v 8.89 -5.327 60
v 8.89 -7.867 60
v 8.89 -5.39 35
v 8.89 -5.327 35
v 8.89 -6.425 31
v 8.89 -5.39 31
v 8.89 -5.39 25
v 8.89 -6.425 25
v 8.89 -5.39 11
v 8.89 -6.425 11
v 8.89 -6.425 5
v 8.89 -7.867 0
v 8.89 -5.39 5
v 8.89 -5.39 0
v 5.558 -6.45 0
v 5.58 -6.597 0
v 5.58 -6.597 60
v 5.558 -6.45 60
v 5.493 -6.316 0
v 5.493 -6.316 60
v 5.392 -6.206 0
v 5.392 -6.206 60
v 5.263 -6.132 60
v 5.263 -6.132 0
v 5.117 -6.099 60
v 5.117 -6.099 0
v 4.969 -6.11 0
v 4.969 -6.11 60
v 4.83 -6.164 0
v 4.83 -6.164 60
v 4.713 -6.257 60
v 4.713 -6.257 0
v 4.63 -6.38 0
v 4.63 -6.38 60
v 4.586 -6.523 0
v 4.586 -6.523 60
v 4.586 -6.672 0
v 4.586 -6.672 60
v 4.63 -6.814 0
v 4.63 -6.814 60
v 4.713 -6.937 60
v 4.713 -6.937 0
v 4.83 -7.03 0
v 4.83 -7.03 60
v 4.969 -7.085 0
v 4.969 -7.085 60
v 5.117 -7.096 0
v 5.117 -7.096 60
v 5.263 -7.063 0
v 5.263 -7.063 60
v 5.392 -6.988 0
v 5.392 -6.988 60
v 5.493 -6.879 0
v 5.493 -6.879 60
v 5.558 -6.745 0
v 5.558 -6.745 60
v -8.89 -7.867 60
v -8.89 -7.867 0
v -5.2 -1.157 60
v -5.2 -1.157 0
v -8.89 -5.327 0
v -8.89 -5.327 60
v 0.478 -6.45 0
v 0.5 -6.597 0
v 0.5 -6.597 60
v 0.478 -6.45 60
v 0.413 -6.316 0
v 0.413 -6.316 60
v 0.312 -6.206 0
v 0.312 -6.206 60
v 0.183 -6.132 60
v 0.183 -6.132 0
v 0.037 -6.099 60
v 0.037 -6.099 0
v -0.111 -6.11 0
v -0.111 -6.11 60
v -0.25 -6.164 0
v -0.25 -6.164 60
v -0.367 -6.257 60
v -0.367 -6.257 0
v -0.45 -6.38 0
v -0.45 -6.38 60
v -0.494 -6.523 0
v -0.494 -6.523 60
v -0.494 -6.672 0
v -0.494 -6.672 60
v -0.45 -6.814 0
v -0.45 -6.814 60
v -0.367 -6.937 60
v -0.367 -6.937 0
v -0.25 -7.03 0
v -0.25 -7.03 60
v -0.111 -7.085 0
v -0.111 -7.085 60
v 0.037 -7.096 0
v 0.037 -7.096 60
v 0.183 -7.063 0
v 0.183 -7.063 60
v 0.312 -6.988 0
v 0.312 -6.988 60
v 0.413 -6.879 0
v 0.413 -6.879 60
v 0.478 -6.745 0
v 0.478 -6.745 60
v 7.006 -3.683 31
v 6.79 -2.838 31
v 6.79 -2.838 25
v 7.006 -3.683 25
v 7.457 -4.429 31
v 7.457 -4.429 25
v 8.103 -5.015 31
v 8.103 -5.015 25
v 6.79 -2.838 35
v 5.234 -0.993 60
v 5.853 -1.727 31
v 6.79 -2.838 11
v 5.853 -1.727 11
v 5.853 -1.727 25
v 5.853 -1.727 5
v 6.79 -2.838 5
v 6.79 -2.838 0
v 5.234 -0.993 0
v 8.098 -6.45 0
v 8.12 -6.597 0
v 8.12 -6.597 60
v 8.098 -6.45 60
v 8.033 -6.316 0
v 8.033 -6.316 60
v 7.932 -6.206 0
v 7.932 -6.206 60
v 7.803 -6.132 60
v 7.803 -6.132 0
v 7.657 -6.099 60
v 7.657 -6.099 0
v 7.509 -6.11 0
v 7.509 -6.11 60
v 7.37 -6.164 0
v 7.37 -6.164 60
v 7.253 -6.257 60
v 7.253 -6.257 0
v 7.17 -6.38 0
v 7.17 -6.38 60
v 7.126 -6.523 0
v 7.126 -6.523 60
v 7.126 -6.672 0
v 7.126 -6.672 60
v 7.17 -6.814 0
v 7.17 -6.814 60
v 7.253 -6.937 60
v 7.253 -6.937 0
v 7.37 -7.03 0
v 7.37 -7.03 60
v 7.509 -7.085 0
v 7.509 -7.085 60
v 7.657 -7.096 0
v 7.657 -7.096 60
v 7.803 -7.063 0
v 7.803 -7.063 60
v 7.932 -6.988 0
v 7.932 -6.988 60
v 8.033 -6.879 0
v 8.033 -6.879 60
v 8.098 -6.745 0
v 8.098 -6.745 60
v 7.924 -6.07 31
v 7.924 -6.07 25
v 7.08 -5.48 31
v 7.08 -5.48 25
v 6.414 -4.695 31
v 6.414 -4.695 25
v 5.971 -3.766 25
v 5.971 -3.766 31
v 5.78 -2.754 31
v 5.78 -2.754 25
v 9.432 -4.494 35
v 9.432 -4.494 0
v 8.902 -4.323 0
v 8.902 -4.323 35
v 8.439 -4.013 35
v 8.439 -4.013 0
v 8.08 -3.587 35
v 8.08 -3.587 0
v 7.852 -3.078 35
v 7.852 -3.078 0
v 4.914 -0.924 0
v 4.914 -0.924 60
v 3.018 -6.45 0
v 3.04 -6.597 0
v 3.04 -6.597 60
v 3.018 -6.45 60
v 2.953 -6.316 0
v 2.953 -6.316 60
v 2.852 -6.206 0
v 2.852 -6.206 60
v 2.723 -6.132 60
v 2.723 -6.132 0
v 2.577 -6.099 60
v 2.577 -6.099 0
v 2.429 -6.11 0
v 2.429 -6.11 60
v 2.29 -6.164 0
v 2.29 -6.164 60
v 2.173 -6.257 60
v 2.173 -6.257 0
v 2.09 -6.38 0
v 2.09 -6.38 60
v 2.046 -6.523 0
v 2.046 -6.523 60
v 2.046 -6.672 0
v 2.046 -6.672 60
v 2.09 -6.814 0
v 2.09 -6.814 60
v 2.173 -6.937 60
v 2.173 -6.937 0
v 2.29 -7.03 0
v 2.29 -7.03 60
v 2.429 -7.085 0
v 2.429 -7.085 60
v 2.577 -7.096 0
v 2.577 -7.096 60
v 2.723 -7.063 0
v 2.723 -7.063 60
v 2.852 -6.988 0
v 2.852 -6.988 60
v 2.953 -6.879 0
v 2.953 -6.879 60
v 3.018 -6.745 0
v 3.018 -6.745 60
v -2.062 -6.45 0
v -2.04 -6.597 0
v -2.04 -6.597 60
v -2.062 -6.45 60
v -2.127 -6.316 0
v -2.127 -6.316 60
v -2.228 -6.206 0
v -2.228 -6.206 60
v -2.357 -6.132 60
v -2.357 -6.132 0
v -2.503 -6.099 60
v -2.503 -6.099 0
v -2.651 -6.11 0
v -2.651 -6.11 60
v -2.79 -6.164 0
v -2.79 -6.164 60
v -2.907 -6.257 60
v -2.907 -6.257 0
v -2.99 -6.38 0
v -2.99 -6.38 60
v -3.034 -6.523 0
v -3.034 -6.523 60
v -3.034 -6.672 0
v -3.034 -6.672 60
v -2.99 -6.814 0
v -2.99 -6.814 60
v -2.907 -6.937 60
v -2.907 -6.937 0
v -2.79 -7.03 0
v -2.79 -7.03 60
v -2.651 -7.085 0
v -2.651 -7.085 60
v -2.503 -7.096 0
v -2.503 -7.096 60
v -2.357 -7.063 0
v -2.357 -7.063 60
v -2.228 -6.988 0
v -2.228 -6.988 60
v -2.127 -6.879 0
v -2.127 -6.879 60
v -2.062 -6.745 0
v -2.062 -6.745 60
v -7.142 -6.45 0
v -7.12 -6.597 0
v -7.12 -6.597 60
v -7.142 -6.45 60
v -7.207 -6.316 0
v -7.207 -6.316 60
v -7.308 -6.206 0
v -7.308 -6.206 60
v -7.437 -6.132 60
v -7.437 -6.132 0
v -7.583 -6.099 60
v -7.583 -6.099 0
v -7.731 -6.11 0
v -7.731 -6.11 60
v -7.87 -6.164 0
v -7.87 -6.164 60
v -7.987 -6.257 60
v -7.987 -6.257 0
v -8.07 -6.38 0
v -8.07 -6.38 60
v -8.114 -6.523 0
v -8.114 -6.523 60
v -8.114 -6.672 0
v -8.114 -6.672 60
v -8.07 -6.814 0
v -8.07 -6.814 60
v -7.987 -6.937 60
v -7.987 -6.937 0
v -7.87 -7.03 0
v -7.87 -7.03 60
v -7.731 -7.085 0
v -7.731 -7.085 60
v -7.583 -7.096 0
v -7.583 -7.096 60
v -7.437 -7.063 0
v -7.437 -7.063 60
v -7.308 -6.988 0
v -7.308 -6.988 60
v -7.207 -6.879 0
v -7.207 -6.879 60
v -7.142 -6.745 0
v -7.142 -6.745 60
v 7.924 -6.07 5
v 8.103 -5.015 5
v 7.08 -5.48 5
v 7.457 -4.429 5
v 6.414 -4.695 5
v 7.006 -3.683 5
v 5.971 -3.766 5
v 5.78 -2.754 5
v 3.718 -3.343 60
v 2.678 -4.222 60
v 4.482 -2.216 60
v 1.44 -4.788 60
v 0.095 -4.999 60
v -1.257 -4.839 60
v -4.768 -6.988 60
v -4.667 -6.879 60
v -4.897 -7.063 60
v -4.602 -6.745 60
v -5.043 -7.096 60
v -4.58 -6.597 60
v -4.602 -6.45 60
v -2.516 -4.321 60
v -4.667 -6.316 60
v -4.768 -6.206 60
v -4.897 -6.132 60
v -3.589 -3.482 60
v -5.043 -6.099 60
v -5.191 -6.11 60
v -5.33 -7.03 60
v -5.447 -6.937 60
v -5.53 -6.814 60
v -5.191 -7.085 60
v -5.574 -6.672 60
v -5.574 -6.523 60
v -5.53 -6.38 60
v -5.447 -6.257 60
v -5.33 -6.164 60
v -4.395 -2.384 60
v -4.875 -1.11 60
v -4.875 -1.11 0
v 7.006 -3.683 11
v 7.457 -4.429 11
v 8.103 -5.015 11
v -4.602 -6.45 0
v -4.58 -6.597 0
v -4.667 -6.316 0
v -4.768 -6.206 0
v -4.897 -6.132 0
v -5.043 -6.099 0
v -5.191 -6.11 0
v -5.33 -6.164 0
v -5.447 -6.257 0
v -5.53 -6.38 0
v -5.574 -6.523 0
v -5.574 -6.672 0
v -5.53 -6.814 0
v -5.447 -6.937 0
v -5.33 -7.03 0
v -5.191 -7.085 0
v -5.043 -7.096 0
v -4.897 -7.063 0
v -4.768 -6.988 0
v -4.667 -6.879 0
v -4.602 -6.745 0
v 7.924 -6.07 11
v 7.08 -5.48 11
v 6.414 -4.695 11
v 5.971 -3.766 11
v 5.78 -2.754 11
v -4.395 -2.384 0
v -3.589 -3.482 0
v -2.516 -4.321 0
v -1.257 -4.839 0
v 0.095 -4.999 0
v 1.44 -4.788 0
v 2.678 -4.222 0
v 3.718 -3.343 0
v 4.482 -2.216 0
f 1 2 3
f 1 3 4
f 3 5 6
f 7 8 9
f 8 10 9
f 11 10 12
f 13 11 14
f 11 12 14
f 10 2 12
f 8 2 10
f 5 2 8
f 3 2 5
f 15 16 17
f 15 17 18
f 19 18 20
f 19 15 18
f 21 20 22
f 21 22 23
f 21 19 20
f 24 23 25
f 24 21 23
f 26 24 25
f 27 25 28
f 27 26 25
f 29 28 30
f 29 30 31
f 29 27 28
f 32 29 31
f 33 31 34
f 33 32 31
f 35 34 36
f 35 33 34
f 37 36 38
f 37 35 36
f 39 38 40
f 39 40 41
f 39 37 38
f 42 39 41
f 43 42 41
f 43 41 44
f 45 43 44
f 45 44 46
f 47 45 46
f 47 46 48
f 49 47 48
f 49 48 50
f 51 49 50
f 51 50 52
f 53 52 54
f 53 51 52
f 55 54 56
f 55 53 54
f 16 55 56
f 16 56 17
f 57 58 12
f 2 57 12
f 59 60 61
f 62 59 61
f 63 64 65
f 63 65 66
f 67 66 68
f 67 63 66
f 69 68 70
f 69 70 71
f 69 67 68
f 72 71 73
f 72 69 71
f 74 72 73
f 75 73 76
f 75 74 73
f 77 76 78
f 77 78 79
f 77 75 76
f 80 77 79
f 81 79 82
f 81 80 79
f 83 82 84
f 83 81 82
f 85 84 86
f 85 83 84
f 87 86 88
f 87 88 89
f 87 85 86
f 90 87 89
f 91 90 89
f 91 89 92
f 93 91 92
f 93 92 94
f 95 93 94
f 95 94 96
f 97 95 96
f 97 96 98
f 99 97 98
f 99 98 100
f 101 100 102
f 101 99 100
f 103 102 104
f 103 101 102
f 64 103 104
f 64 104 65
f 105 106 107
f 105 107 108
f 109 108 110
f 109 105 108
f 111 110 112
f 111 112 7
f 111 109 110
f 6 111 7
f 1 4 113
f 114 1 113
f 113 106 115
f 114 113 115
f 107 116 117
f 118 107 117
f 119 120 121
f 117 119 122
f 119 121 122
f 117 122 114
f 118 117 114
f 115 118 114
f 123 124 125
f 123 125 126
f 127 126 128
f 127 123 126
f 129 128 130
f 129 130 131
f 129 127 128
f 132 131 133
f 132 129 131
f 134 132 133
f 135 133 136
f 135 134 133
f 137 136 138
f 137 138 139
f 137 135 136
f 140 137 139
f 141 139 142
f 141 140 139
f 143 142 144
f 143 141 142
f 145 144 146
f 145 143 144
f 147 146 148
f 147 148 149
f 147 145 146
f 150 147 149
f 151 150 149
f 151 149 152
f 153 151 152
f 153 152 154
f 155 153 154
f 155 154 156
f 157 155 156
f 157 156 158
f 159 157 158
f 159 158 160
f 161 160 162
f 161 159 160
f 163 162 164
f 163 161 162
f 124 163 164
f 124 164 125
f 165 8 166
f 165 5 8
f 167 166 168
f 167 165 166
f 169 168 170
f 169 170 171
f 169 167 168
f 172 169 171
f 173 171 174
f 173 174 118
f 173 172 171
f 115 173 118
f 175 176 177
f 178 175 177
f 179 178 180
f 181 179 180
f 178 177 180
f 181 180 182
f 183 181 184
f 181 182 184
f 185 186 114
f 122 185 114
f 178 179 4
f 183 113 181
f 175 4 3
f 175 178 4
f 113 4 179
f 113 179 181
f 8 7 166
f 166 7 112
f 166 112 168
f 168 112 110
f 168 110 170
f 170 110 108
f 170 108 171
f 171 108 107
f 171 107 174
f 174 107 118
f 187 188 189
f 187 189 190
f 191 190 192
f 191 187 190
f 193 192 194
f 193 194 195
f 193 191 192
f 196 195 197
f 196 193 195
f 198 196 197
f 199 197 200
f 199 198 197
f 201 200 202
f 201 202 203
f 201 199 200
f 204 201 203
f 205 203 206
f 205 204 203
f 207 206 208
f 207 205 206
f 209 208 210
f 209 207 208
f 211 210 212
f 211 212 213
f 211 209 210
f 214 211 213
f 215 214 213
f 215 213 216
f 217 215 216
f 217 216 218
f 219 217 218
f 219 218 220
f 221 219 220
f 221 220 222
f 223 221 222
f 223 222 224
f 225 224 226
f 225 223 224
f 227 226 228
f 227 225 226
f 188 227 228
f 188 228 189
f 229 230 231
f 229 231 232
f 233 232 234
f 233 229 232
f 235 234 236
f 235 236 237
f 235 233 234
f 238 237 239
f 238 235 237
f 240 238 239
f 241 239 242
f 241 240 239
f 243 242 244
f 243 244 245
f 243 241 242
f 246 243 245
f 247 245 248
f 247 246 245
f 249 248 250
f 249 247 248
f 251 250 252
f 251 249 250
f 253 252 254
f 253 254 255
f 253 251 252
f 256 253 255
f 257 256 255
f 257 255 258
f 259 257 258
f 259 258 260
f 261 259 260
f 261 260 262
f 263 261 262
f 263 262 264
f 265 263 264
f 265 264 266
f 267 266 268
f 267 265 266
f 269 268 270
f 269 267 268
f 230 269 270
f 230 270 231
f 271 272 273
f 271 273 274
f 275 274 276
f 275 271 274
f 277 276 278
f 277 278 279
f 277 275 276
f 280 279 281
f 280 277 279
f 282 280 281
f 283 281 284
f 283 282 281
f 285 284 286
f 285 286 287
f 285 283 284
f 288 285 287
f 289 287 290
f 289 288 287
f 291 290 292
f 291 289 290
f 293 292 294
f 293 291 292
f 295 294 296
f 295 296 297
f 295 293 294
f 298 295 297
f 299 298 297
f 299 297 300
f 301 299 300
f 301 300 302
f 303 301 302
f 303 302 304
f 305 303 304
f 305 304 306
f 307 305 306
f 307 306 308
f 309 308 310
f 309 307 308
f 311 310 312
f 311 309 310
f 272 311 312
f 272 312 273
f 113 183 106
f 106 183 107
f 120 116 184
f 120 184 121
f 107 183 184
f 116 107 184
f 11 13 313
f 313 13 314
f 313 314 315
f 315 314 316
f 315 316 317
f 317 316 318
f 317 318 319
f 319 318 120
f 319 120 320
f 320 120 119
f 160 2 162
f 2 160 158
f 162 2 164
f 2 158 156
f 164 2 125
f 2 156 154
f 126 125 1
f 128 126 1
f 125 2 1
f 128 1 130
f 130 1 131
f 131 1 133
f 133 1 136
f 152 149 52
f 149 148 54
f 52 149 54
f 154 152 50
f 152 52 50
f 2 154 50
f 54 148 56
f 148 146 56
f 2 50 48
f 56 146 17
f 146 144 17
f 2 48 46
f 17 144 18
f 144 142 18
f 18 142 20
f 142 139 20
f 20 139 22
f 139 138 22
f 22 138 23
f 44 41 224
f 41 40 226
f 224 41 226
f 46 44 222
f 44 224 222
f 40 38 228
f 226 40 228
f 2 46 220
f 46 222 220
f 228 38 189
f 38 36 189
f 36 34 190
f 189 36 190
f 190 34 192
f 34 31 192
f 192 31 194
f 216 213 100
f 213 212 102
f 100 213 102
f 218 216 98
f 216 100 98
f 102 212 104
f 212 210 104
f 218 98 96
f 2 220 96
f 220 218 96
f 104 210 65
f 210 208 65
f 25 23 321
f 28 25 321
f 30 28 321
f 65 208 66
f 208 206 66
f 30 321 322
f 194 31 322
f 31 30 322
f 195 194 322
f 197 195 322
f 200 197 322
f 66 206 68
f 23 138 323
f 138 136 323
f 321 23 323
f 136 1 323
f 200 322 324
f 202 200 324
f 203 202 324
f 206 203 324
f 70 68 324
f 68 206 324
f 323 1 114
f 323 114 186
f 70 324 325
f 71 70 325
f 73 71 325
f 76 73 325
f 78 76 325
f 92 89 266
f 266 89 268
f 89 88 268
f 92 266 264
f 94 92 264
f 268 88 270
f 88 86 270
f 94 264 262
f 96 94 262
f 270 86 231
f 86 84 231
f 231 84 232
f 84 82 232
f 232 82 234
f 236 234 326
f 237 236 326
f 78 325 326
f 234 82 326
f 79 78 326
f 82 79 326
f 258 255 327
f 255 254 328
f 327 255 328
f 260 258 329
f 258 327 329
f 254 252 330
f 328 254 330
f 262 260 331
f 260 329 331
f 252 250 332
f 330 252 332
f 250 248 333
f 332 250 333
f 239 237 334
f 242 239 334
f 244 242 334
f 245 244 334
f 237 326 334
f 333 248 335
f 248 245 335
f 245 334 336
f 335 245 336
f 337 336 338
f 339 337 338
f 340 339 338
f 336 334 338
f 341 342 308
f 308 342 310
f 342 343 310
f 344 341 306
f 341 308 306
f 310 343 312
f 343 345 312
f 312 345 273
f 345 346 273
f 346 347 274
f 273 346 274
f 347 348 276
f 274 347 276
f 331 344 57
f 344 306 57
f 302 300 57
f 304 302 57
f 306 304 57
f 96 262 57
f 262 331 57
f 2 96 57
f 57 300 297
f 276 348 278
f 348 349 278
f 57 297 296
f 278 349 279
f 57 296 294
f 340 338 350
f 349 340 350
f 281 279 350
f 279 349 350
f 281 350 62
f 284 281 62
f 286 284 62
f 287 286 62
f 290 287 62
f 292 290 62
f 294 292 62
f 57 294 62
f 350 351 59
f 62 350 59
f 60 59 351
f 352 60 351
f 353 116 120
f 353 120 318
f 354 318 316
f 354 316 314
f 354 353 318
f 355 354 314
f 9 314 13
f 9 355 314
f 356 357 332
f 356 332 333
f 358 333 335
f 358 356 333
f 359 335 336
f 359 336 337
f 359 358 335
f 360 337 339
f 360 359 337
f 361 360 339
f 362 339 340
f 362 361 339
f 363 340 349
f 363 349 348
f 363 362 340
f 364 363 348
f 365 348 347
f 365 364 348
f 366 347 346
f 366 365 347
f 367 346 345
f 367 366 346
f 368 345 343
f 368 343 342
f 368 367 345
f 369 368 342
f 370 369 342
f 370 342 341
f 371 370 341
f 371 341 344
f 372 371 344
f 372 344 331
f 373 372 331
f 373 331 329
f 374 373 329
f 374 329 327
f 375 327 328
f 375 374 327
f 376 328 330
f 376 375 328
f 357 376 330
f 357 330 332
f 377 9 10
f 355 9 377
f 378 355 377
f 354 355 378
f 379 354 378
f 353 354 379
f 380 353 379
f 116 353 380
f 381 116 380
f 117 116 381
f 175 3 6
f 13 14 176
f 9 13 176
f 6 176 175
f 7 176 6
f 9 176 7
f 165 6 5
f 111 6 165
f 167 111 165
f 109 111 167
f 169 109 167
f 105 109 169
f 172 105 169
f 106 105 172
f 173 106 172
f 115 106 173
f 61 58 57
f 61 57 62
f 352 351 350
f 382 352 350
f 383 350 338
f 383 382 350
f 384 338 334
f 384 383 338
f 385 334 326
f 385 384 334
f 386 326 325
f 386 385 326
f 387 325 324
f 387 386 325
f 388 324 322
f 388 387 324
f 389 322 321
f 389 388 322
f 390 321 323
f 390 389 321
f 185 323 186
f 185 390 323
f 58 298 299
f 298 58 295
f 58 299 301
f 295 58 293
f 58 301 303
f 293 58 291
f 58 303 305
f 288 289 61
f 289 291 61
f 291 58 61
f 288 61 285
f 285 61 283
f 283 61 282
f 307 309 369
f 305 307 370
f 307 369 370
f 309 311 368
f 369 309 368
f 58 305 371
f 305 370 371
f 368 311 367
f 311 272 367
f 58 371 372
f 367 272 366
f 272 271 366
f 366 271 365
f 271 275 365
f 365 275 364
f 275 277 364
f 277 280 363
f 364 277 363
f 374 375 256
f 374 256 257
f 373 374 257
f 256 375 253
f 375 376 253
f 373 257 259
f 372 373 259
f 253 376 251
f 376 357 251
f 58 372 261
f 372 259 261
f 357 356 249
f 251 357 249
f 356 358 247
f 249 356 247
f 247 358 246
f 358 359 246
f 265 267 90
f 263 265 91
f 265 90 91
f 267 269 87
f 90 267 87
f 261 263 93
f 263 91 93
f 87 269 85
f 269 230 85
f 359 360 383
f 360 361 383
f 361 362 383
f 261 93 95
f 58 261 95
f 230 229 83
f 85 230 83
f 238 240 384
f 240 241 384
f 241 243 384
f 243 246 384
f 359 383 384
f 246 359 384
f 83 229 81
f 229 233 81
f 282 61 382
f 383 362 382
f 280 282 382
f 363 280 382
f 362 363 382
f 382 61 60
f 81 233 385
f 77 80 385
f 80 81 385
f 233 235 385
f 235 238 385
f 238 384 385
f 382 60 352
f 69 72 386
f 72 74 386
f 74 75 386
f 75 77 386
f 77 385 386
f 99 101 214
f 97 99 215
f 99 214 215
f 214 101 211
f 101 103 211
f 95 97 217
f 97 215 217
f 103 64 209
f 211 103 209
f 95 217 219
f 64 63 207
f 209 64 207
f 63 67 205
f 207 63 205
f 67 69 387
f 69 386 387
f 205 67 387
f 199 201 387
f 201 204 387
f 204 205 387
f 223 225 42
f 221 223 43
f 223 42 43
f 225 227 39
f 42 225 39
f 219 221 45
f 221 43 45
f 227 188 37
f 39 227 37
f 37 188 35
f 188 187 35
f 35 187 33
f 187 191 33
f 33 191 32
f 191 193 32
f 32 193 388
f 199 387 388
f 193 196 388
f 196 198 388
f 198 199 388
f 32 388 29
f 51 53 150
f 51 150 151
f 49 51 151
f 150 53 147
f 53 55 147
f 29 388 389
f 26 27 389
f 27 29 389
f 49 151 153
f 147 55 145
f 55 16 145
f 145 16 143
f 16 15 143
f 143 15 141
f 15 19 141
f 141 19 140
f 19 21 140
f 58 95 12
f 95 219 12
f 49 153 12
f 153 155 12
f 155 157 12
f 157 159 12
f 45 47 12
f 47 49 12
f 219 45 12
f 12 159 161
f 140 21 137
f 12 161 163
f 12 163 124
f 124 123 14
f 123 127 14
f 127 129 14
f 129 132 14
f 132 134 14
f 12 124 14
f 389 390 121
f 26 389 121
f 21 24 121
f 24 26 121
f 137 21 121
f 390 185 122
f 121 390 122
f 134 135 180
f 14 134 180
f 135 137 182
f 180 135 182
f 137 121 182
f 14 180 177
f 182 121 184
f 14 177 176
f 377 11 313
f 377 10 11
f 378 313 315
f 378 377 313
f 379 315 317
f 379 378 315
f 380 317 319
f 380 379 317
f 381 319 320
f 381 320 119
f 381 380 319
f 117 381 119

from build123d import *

# Parameters (mm, degrees)
SKETCH1_W           = 17.78
SKETCH1_H           = 2.54
SKETCH1_R           = 0.5
BOSS_EXTRUDE1_DEPTH = 60
CUT_EXTRUDE1_START  = 8
CUT_EXTRUDE1_DEPTH  = 3
CUT_EXTRUDE2_START  = 28
CUT_EXTRUDE2_DEPTH  = 3
BOSS_EXTRUDE2_DEPTH = 35


with BuildPart() as part:
    # Sketch1 → Boss-Extrude1 (new body)
    with BuildSketch(Plane.XY):
        with BuildLine():
            Line((-5.200349399, -1.156583023), (-4.875189675, -1.110191708))
            ThreePointArc((-4.875189675, -1.110191708), (0.094891357, -4.999099482), (4.913809284, -0.924379964))
            Line((4.913809284, -0.924379964), (5.23403324, -0.993083178))
            ThreePointArc((5.23403324, -0.993083178), (0.083466761, -5.326758063), (-5.200349399, -1.156583023))
        make_face()
        with BuildLine():
            Line((-5.200349399, -1.156583023), (-8.89, -5.327411957))
            Line((-8.89, -5.327411957), (-9e-09, -5.327411957))
            ThreePointArc((-9e-09, -5.327411957), (-3.33314596, -4.155894148), (-5.200349399, -1.156583023))
        make_face()
        with Locations((0, -6.597411957)):
            Rectangle(SKETCH1_W, SKETCH1_H)
        with Locations((7.62, -6.597411957)):
            Circle(SKETCH1_R, mode=Mode.SUBTRACT)
        with Locations((5.08, -6.597411957)):
            Circle(SKETCH1_R, mode=Mode.SUBTRACT)
        with Locations((2.54, -6.597411957)):
            Circle(SKETCH1_R, mode=Mode.SUBTRACT)
        with Locations((0, -6.597411957)):
            Circle(SKETCH1_R, mode=Mode.SUBTRACT)
        with Locations((-2.54, -6.597411957)):
            Circle(SKETCH1_R, mode=Mode.SUBTRACT)
        with Locations((-5.08, -6.597411957)):
            Circle(SKETCH1_R, mode=Mode.SUBTRACT)
        with Locations((-7.62, -6.597411957)):
            Circle(SKETCH1_R, mode=Mode.SUBTRACT)
        with BuildLine():
            ThreePointArc((5.23403324, -0.993083178), (3.397848946, -4.103162281), (-9e-09, -5.327411957))
            Line((-9e-09, -5.327411957), (8.89, -5.327411957))
            Line((8.89, -5.327411957), (5.23403324, -0.993083178))
        make_face()
    extrude(amount=BOSS_EXTRUDE1_DEPTH)

    # Sketch2 → Cut-Extrude1 (cut, symmetric)
    with BuildSketch(Plane.XY.offset(CUT_EXTRUDE1_START)):
        with BuildLine():
            ThreePointArc((6.790005825, -2.837765364), (7.456750164, -4.429353345), (8.89, -5.390339932))
            Line((8.89, -5.390339932), (8.89, -6.424592971))
            ThreePointArc((8.89, -6.424592971), (6.41429556, -4.694977723), (5.853473578, -1.727460228))
            Line((5.853473578, -1.727460228), (6.790005825, -2.837765364))
        make_face()
    extrude(amount=CUT_EXTRUDE1_DEPTH, both=True, mode=Mode.SUBTRACT)

    # Sketch2<3> → Cut-Extrude2 (cut, symmetric)
    with BuildSketch(Plane.XY.offset(CUT_EXTRUDE2_START)):
        with BuildLine():
            ThreePointArc((6.790005825, -2.837765364), (7.456750164, -4.429353345), (8.89, -5.390339932))
            Line((8.89, -5.390339932), (8.89, -6.424592971))
            ThreePointArc((8.89, -6.424592971), (6.41429556, -4.694977723), (5.853473578, -1.727460228))
            Line((5.853473578, -1.727460228), (6.790005825, -2.837765364))
        make_face()
    extrude(amount=CUT_EXTRUDE2_DEPTH, both=True, mode=Mode.SUBTRACT)

    # Sketch2<4> → Boss-Extrude2 (add)
    with BuildSketch(Plane.XY):
        with BuildLine():
            Line((7.852011126, -3.078294754), (6.790005825, -2.837765364))
            ThreePointArc((6.790005825, -2.837765364), (7.456750164, -4.429353345), (8.89, -5.390339932))
            Line((8.89, -5.390339932), (9.432365549, -4.494075888))
            ThreePointArc((9.432365549, -4.494075888), (8.438966293, -4.01303031), (7.852011126, -3.078294754))
        make_face()
    extrude(amount=BOSS_EXTRUDE2_DEPTH)


solid = part.part
